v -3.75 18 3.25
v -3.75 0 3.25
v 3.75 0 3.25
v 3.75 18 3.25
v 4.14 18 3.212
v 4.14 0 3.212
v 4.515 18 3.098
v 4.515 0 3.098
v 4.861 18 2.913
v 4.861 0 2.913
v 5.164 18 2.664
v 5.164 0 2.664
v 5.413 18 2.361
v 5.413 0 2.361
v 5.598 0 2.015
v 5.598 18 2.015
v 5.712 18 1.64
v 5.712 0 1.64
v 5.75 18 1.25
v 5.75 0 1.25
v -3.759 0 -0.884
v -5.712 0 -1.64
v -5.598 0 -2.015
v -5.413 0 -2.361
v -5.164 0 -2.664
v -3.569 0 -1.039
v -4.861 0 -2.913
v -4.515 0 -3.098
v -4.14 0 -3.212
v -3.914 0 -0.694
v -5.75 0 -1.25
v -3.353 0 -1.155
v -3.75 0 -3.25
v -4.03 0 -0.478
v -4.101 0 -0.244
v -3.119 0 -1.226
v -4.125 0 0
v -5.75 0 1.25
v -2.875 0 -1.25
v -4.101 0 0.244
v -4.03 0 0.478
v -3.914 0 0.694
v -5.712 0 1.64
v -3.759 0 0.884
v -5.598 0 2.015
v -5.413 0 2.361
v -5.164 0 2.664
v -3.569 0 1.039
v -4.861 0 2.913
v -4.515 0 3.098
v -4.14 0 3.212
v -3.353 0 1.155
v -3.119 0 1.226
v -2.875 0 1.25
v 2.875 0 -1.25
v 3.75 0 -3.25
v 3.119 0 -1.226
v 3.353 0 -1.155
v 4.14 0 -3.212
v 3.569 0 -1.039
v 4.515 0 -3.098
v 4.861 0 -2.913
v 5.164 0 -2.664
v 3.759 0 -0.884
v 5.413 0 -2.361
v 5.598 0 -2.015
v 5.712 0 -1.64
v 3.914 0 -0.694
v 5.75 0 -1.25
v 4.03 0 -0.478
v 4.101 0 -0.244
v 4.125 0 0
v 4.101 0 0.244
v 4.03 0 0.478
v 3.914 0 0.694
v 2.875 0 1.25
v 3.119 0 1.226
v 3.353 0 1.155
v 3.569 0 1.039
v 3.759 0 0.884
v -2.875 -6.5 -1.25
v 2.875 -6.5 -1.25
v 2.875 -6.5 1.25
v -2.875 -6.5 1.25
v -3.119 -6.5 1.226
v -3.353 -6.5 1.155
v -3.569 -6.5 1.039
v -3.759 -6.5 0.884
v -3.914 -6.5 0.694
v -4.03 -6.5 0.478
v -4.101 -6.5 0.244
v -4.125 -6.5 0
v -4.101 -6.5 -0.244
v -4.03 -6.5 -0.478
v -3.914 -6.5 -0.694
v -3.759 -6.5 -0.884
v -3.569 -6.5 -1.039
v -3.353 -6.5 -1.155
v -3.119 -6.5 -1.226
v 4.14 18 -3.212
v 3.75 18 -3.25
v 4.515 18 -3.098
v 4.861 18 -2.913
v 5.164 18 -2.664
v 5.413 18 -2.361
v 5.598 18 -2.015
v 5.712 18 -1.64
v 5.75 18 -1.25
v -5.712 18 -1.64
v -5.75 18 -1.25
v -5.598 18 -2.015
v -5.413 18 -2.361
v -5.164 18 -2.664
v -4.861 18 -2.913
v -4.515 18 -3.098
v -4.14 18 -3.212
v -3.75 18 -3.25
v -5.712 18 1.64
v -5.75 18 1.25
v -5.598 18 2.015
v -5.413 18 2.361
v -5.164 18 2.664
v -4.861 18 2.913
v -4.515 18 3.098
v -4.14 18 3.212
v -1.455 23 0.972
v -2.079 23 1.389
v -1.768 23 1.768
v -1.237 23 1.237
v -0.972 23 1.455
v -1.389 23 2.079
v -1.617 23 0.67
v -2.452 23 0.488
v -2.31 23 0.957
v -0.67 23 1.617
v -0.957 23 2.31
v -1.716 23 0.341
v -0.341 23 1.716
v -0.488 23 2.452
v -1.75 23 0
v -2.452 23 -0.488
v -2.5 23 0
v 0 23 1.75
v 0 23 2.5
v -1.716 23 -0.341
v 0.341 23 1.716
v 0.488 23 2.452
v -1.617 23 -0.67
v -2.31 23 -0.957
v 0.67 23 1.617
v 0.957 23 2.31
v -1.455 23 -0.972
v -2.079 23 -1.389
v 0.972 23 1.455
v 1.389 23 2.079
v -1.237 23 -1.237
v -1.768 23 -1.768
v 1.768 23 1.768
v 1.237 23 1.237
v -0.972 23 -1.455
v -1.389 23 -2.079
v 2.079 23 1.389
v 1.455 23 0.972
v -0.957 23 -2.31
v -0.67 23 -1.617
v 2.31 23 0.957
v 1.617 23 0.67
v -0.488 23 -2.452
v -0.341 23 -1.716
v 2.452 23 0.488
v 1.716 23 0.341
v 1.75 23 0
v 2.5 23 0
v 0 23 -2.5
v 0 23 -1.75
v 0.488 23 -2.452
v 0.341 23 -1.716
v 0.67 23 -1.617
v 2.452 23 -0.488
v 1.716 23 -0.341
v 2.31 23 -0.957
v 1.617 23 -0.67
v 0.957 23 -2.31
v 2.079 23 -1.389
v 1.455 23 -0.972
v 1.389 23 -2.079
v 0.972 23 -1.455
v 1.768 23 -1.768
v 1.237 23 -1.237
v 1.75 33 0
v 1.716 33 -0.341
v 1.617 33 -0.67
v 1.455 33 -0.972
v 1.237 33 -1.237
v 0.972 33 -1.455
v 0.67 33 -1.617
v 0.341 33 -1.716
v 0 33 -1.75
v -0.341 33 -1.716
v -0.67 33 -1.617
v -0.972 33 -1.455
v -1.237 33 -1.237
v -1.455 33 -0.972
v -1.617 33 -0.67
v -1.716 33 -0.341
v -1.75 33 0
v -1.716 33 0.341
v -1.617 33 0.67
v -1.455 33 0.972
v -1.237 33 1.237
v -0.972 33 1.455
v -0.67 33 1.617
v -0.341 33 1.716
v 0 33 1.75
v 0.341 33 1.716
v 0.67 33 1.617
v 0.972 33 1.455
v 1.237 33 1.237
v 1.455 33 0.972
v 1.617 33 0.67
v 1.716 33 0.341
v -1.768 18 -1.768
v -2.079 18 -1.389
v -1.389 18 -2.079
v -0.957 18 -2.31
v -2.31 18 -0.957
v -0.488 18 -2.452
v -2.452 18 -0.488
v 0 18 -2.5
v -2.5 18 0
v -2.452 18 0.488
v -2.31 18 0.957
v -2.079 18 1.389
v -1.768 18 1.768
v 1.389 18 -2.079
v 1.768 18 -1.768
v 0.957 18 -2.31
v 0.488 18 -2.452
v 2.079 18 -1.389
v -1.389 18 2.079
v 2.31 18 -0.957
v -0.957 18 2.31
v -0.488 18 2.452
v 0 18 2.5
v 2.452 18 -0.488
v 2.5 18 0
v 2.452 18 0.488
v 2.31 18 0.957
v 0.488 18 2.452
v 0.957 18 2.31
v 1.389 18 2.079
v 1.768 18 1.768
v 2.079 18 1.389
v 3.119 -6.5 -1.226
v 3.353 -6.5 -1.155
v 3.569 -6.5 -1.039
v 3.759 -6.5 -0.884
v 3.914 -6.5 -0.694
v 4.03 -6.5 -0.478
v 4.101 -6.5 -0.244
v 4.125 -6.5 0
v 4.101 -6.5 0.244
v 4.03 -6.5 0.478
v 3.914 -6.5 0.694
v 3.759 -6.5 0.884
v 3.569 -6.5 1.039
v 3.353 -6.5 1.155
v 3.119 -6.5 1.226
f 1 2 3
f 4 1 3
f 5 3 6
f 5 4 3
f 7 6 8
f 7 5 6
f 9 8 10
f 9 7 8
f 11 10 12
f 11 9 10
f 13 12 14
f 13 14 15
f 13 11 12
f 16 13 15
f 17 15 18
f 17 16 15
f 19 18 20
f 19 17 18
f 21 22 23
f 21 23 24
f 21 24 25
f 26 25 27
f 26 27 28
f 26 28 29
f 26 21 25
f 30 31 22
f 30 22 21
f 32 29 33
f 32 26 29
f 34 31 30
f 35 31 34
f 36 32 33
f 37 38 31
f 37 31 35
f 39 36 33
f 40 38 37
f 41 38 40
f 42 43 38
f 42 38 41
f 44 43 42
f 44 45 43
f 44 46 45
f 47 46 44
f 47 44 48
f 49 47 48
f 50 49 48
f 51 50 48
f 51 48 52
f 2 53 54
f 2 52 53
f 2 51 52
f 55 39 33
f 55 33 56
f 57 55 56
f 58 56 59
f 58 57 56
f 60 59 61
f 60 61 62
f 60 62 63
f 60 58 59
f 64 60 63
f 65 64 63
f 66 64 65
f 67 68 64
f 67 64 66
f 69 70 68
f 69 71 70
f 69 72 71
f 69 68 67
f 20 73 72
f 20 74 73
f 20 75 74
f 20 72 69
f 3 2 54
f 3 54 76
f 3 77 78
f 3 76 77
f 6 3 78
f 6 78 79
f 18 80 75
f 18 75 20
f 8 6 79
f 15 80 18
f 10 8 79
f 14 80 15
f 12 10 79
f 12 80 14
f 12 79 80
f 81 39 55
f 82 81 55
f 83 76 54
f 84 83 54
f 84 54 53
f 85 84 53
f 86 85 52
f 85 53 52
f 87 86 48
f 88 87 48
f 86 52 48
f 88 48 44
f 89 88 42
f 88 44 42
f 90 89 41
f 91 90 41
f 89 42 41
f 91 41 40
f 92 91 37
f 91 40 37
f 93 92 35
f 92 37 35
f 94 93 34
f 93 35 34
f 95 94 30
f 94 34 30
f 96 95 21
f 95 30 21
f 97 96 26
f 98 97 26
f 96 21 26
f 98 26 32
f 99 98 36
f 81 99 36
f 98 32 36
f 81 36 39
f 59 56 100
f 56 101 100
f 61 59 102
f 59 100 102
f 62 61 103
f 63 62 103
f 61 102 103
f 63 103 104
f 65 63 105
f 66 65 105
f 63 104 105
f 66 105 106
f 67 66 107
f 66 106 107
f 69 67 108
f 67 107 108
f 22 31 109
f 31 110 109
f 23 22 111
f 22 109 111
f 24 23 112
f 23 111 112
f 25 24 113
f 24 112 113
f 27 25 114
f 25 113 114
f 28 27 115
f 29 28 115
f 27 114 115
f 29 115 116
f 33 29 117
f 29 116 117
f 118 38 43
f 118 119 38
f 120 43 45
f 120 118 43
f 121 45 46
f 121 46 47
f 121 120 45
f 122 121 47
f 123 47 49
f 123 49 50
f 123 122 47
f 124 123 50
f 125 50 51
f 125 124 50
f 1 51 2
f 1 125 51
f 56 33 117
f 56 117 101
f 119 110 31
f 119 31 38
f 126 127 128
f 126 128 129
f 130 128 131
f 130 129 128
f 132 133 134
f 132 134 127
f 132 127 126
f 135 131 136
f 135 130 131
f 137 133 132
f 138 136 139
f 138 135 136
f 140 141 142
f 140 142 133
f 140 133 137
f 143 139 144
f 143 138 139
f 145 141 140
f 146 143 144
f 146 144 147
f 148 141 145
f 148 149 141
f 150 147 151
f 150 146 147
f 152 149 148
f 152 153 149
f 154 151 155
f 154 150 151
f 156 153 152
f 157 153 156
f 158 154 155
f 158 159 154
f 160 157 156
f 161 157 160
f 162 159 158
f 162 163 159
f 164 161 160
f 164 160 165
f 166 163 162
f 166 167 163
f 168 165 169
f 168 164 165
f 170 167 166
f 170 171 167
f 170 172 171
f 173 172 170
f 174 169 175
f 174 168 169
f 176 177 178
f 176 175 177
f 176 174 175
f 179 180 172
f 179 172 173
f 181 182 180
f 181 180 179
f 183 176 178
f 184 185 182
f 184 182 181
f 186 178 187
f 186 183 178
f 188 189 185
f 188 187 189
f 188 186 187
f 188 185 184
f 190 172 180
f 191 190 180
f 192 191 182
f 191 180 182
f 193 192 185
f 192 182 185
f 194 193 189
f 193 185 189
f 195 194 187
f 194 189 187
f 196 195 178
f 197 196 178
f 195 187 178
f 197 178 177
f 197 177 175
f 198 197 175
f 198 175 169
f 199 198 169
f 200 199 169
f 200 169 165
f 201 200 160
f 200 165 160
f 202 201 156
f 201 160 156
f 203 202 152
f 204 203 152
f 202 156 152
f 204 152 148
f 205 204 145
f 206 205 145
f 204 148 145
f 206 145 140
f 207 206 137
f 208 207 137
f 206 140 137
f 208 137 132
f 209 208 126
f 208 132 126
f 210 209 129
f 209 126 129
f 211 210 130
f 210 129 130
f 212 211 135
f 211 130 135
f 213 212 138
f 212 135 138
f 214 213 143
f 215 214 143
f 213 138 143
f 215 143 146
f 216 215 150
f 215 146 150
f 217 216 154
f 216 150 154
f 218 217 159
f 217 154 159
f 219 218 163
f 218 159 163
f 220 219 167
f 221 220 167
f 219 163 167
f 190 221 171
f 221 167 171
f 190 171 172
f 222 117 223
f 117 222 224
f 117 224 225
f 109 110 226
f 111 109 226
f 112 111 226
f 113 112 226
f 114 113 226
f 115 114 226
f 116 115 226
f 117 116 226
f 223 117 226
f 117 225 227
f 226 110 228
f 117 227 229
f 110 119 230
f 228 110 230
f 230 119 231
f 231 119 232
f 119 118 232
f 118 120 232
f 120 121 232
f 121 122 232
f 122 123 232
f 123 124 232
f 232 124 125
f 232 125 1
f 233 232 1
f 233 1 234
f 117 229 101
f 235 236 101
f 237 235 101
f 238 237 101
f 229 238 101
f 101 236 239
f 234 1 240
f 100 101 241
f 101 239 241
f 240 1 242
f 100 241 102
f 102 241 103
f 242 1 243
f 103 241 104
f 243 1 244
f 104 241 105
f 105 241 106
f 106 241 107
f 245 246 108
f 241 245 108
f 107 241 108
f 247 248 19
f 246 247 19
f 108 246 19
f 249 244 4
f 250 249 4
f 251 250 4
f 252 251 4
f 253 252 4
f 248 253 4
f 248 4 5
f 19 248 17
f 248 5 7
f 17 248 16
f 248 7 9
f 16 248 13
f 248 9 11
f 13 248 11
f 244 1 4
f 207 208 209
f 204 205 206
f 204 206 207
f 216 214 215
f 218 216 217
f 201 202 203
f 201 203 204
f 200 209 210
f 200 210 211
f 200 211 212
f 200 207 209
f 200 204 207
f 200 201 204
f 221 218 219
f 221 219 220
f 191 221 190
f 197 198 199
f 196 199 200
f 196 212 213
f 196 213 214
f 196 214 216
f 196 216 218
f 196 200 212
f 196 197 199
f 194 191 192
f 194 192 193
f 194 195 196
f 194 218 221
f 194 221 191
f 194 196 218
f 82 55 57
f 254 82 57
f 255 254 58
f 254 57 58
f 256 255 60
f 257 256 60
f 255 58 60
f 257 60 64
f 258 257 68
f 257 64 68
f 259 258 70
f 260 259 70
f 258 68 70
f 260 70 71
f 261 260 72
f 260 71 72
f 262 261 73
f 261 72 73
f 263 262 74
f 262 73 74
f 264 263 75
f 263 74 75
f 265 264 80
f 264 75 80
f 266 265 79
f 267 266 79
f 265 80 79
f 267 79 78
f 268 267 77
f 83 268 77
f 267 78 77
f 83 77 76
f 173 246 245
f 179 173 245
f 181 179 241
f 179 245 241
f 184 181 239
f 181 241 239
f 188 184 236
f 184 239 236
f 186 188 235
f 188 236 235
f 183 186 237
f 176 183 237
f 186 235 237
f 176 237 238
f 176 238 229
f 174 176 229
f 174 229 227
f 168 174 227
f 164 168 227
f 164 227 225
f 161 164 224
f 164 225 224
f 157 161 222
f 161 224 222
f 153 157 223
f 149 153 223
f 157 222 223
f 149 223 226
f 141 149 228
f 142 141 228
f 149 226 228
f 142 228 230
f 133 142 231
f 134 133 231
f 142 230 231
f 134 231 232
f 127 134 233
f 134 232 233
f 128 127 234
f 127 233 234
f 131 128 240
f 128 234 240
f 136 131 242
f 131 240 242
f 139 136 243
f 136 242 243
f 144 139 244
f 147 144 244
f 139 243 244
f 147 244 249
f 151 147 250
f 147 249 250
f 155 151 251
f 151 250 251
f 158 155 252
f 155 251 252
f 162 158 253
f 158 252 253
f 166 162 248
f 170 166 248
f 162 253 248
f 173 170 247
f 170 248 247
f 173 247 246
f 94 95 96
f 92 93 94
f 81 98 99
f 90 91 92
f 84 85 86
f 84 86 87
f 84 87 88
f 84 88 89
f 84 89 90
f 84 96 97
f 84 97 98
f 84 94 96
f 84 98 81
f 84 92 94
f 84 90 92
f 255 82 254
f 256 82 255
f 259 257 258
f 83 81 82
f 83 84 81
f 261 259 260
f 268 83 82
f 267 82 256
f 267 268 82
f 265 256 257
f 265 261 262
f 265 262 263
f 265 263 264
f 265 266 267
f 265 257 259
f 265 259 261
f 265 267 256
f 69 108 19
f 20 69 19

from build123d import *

# Parameters (mm, degrees)
PAD_DEPTH    = 6.5
SKETCH001_W  = 11.5
SKETCH001_H  = 6.5
PAD001_DEPTH = 18
FILLET_R     = 2
SKETCH002_R  = 2.5
PAD002_DEPTH = 5
SKETCH003_R  = 1.75
PAD003_DEPTH = 10


with BuildPart() as part:
    # Sketch → Pad (new body)
    with BuildSketch(Plane.XZ):
        with BuildLine():
            ThreePointArc((-2.875, 1.25), (-4.125, 0), (-2.875, -1.25))
            Line((-2.875, -1.25), (2.875, -1.25))
            ThreePointArc((2.875, -1.25), (4.125, 0), (2.875, 1.25))
            Line((2.875, 1.25), (-2.875, 1.25))
        make_face()
    extrude(amount=PAD_DEPTH)

    # Sketch001 → Pad001 (join)
    with BuildSketch(Plane.XZ):
        Rectangle(SKETCH001_W, SKETCH001_H)
    extrude(amount=-PAD001_DEPTH)

    # Fillet
    fillet_edges = [part.edges().sort_by_distance(p)[0] for p in [
        (-5.75, 9, 3.25),
        (5.75, 9, 3.25),
        (5.75, 9, -3.25),
        (-5.75, 9, -3.25),
    ]]
    fillet(fillet_edges, radius=FILLET_R)

    # Sketch002 (on Face5 of Fillet) → Pad002 (join)
    with BuildSketch(Plane(origin=(0, 18, 0), x_dir=(1, 0, 0), z_dir=(0, 1, 0))):
        Circle(SKETCH002_R)
    extrude(amount=PAD002_DEPTH)

    # Sketch003 (on Face17 of Pad002) → Pad003 (join)
    with BuildSketch(Plane(origin=(0, 23, 0), x_dir=(1, 0, 0), z_dir=(0, 1, 0))):
        Circle(SKETCH003_R)
    extrude(amount=PAD003_DEPTH)


solid = part.part
